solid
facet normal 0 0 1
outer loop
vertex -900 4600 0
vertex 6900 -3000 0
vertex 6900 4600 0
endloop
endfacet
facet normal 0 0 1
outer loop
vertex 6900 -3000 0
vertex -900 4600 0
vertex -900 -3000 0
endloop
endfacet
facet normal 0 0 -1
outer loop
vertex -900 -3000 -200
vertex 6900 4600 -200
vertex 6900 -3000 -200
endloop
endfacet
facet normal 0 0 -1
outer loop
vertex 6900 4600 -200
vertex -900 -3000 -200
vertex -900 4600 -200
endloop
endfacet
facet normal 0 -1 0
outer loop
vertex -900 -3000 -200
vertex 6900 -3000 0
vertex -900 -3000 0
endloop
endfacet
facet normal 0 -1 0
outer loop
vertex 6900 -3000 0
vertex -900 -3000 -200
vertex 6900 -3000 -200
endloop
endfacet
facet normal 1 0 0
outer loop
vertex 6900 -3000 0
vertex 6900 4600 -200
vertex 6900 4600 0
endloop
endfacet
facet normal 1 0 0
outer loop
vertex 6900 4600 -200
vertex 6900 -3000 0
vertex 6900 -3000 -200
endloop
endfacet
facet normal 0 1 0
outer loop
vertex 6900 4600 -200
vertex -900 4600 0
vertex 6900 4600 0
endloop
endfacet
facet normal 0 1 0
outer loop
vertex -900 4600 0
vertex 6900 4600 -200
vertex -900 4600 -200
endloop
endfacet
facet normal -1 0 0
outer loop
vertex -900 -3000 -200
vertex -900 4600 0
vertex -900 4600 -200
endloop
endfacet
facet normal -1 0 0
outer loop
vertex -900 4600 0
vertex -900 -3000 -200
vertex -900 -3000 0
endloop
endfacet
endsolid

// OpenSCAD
// file: tea_shop_parameters.scad
// =============================================================================
// Tea Shop — SHARED PARAMETERS (Base & Shell)
// -----------------------------------------------------------------------------
// OpenSCAD's native unit is 1 mm, so every value here is the REAL-LIFE size
// in millimetres (1000 mm = 1 m). E.g. building_width = 6000 means 6.0 m.
//
// For MLO / FiveM (which uses metres as 1 unit = 1 m), either:
//   (a) export each STL here and re-import at a scale of 0.001 (mm -> m), or
//   (b) model in metres directly by dividing every value below by 1000.
//
// Tune each value here; every module pulls its size from these variables.
// =============================================================================


// --- building shell / roof (lean-to: TALL back, SHORT front eave) -----------
wall_thickness    = 250;   // wall panel thickness                      (0.25 m)
building_width    = 6000;  // X extent, left wall -> right wall          (6.00 m)
building_depth    = 4000;  // Y extent, front eave -> back wall          (4.00 m)
back_height       = 3200;  // full wall height at the BACK (tall side)   (3.20 m)
front_eave_height = 2400;  // wall height at the FRONT eave (short side) (2.40 m)

// --- front wall openings (service window + door), measured along X ----------
left_pier_width   = 600;   // solid pier left of the service window      (0.60 m)
window_width      = 3400;  // service window opening width — made WIDE   (3.40 m)
mid_pier_width    = 500;   // solid pier between window and door         (0.50 m)
door_width        = 1000;  // door opening width                         (1.00 m)
sill_height       = 900;   // knee-wall (sill) height beneath the window (0.90 m)

// --- base slab / plinth ------------------------------------------------------
base_thickness    = 200;   // vertical thickness of the ground plinth    (0.20 m)
base_side_margin  = 900;   // slab overhang beyond left/right walls      (0.90 m)
base_back_margin  = 600;   // slab overhang behind the back wall         (0.60 m)
base_front_margin = 3000;  // extra slab in FRONT = porch/patio (pergola)(3.00 m)


// -----------------------------------------------------------------------------
// DERIVED DIMENSIONS (do not edit — computed from the values above)
// -----------------------------------------------------------------------------

// front-wall pier chain, left -> right, must sum exactly to building_width
window_left      = left_pier_width;                    // X where the window starts
window_right     = window_left + window_width;         // X where the window ends
door_left        = window_right + mid_pier_width;      // X where the door starts
door_right       = door_left + door_width;             // X where the door ends
right_pier_width = building_width - door_right;        // fills the rest to the corner

// window opening rises from the top of the sill up to the front eave line
window_open_height = front_eave_height - sill_height;
// file: tea_shop_modules.scad
// =============================================================================
// Tea Shop — MODULE LIBRARY (Base & Shell)
// -----------------------------------------------------------------------------
// This file only DEFINES the parts (and the assemble() preview). It instantiates
// NO geometry on its own, so it can be include'd by the individual export files
// (part_*.scad) and by tea_shop_assemble.scad without producing duplicates.
//
// GLOBAL COORDINATE SYSTEM (shared by every piece — no per-part centering):
//   +X -> left -> right  (building WIDTH along X, left wall at X=0)
//   +Y -> front -> back  (building DEPTH along Y, front eave at Y=0)
//   +Z -> up             (ground/porch surface = Z=0)
//
//   Building footprint = [0..building_width] x [0..building_depth].
//   Roof = single-pitch lean-to: TALL at BACK (Y=depth), SHORT at FRONT (Y=0).
// =============================================================================

include <tea_shop_parameters.scad>;


// -----------------------------------------------------------------------------
// _trapezoid_prism — shared core for the two side walls. It draws the side
// elevation (depth x height) as a 2D polygon, then linear_extrude +
// rotate([0,-90,0]) stand it up so its thickness runs along X. The front edge
// (Y=0) is the short eave height and the back edge (Y=depth) is the full back
// height, so the top edge automatically matches the roof pitch. Result
// occupies X = [0 .. wall_thickness].
// -----------------------------------------------------------------------------
module _trapezoid_prism() {
    translate([wall_thickness, 0, 0])
        rotate([0, -90, 0])
            linear_extrude(height = wall_thickness)
                polygon(points = [
                    [0,                 0],               // front, ground
                    [0,                 building_depth],  // back,  ground
                    [back_height,       building_depth],  // back,  top (tall)
                    [front_eave_height, 0]                // front, top (eave)
                ]);
}


// =============================================================================
// base_slab — flat ground plinth. Extends past the building on all sides, with
// a generous margin up front to form the porch/patio where the bench / stools
// sit under the pergola. Top surface is the datum Z=0.
// =============================================================================
module base_slab() {
    translate([-base_side_margin, -base_front_margin, -base_thickness])
        cube([
            building_width + 2 * base_side_margin,                 // X
            building_depth + base_front_margin + base_back_margin, // Y
            base_thickness                                          // Z
        ]);
}


// =============================================================================
// back_wall — solid rectangular panel, full building width and FULL height
// (the tall side of the lean-to). Sits at the back edge of the footprint.
// =============================================================================
module back_wall() {
    translate([0, building_depth - wall_thickness, 0])
        cube([building_width, wall_thickness, back_height]);
}


// =============================================================================
// left_side_wall — trapezoidal panel, TALL at the back edge and SHORT at the
// front edge, matching the roof slope. Occupies X = [0 .. wall_thickness].
// =============================================================================
module left_side_wall() {
    _trapezoid_prism();
}


// =============================================================================
// right_side_wall — mirror image of the left wall (identical trapezoid cross
// section, since both walls slope down toward the FRONT eave), placed at the
// right edge X = [building_width - wall_thickness .. building_width].
// Plain — no openings.
// =============================================================================
module right_side_wall() {
    translate([building_width - wall_thickness, 0, 0])
        _trapezoid_prism();
}


// =============================================================================
// FRONT WALL — broken into solid piers + a knee-wall (sill), leaving a service
// window opening and a door opening. Every front piece tops out at the front
// eave height (the horizontal line where the roof meets the front wall).
//
//   |<- left ->|<--- window --->|<- mid ->|<-- door -->|<- right ->|
//   |   pier   |    (opening)   |   pier  |  (opening)  |   pier   |
//   |          |   [sill below] |         |             |          |
// =============================================================================

// front_wall_left_pier — solid pier left of the service window, ground to eave.
module front_wall_left_pier() {
    translate([0, 0, 0])
        cube([left_pier_width, wall_thickness, front_eave_height]);
}


// front_wall_sill — the low knee-wall beneath the service window opening.
// The window opening sits above it.
// TODO: counter + window frame modules slot in above this sill (later group).
module front_wall_sill() {
    translate([window_left, 0, 0])
        cube([window_width, wall_thickness, sill_height]);
}


// front_wall_mid_pier — solid pier between the window and the door, full height.
module front_wall_mid_pier() {
    translate([window_right, 0, 0])
        cube([mid_pier_width, wall_thickness, front_eave_height]);
}


// front_wall_right_pier — solid pier right of the door, out to the front corner.
// Width is derived so the pier chain always ends flush with the right corner.
module front_wall_right_pier() {
    translate([door_right, 0, 0])
        cube([right_pier_width, wall_thickness, front_eave_height]);
}


// -----------------------------------------------------------------------------
// OPENING ANNOTATIONS (for reference — these are EMPTY volumes in the shell):
//
//   Service window opening:
//     X = [window_left .. window_right], Z = [sill_height .. front_eave_height]
//     TODO: window frame + service counter modules slot in here (later group).
//
//   Door opening:
//     X = [door_left .. door_right], Z = [0 .. front_eave_height] (full height)
//     TODO: door / door-frame module slots in here (later group).
// -----------------------------------------------------------------------------


// =============================================================================
// assemble — visual verification ONLY (not for export). Shows every piece in
// the shared coordinate system, each in its own colour, so the assembled shell
// can be checked against the reference before exporting individual STLs.
// =============================================================================
module assemble() {
    color("LightGray")  base_slab();

    color("SkyBlue")    back_wall();
    color("Orange")     left_side_wall();
    color("Orange")     right_side_wall();

    color("FireBrick")  front_wall_left_pier();
    color("Peru")       front_wall_sill();
    color("FireBrick")  front_wall_mid_pier();
    color("FireBrick")  front_wall_right_pier();
}
// main file
// =============================================================================
// part_base_slab.scad — export the BASE SLAB only.
// Open this file, press F6 (render), then export as STL. Everything sits in the
// shared global coordinate system, so re-importing all parts together lines up
// automatically with no manual repositioning.
// =============================================================================

include <tea_shop_modules.scad>;

base_slab();
